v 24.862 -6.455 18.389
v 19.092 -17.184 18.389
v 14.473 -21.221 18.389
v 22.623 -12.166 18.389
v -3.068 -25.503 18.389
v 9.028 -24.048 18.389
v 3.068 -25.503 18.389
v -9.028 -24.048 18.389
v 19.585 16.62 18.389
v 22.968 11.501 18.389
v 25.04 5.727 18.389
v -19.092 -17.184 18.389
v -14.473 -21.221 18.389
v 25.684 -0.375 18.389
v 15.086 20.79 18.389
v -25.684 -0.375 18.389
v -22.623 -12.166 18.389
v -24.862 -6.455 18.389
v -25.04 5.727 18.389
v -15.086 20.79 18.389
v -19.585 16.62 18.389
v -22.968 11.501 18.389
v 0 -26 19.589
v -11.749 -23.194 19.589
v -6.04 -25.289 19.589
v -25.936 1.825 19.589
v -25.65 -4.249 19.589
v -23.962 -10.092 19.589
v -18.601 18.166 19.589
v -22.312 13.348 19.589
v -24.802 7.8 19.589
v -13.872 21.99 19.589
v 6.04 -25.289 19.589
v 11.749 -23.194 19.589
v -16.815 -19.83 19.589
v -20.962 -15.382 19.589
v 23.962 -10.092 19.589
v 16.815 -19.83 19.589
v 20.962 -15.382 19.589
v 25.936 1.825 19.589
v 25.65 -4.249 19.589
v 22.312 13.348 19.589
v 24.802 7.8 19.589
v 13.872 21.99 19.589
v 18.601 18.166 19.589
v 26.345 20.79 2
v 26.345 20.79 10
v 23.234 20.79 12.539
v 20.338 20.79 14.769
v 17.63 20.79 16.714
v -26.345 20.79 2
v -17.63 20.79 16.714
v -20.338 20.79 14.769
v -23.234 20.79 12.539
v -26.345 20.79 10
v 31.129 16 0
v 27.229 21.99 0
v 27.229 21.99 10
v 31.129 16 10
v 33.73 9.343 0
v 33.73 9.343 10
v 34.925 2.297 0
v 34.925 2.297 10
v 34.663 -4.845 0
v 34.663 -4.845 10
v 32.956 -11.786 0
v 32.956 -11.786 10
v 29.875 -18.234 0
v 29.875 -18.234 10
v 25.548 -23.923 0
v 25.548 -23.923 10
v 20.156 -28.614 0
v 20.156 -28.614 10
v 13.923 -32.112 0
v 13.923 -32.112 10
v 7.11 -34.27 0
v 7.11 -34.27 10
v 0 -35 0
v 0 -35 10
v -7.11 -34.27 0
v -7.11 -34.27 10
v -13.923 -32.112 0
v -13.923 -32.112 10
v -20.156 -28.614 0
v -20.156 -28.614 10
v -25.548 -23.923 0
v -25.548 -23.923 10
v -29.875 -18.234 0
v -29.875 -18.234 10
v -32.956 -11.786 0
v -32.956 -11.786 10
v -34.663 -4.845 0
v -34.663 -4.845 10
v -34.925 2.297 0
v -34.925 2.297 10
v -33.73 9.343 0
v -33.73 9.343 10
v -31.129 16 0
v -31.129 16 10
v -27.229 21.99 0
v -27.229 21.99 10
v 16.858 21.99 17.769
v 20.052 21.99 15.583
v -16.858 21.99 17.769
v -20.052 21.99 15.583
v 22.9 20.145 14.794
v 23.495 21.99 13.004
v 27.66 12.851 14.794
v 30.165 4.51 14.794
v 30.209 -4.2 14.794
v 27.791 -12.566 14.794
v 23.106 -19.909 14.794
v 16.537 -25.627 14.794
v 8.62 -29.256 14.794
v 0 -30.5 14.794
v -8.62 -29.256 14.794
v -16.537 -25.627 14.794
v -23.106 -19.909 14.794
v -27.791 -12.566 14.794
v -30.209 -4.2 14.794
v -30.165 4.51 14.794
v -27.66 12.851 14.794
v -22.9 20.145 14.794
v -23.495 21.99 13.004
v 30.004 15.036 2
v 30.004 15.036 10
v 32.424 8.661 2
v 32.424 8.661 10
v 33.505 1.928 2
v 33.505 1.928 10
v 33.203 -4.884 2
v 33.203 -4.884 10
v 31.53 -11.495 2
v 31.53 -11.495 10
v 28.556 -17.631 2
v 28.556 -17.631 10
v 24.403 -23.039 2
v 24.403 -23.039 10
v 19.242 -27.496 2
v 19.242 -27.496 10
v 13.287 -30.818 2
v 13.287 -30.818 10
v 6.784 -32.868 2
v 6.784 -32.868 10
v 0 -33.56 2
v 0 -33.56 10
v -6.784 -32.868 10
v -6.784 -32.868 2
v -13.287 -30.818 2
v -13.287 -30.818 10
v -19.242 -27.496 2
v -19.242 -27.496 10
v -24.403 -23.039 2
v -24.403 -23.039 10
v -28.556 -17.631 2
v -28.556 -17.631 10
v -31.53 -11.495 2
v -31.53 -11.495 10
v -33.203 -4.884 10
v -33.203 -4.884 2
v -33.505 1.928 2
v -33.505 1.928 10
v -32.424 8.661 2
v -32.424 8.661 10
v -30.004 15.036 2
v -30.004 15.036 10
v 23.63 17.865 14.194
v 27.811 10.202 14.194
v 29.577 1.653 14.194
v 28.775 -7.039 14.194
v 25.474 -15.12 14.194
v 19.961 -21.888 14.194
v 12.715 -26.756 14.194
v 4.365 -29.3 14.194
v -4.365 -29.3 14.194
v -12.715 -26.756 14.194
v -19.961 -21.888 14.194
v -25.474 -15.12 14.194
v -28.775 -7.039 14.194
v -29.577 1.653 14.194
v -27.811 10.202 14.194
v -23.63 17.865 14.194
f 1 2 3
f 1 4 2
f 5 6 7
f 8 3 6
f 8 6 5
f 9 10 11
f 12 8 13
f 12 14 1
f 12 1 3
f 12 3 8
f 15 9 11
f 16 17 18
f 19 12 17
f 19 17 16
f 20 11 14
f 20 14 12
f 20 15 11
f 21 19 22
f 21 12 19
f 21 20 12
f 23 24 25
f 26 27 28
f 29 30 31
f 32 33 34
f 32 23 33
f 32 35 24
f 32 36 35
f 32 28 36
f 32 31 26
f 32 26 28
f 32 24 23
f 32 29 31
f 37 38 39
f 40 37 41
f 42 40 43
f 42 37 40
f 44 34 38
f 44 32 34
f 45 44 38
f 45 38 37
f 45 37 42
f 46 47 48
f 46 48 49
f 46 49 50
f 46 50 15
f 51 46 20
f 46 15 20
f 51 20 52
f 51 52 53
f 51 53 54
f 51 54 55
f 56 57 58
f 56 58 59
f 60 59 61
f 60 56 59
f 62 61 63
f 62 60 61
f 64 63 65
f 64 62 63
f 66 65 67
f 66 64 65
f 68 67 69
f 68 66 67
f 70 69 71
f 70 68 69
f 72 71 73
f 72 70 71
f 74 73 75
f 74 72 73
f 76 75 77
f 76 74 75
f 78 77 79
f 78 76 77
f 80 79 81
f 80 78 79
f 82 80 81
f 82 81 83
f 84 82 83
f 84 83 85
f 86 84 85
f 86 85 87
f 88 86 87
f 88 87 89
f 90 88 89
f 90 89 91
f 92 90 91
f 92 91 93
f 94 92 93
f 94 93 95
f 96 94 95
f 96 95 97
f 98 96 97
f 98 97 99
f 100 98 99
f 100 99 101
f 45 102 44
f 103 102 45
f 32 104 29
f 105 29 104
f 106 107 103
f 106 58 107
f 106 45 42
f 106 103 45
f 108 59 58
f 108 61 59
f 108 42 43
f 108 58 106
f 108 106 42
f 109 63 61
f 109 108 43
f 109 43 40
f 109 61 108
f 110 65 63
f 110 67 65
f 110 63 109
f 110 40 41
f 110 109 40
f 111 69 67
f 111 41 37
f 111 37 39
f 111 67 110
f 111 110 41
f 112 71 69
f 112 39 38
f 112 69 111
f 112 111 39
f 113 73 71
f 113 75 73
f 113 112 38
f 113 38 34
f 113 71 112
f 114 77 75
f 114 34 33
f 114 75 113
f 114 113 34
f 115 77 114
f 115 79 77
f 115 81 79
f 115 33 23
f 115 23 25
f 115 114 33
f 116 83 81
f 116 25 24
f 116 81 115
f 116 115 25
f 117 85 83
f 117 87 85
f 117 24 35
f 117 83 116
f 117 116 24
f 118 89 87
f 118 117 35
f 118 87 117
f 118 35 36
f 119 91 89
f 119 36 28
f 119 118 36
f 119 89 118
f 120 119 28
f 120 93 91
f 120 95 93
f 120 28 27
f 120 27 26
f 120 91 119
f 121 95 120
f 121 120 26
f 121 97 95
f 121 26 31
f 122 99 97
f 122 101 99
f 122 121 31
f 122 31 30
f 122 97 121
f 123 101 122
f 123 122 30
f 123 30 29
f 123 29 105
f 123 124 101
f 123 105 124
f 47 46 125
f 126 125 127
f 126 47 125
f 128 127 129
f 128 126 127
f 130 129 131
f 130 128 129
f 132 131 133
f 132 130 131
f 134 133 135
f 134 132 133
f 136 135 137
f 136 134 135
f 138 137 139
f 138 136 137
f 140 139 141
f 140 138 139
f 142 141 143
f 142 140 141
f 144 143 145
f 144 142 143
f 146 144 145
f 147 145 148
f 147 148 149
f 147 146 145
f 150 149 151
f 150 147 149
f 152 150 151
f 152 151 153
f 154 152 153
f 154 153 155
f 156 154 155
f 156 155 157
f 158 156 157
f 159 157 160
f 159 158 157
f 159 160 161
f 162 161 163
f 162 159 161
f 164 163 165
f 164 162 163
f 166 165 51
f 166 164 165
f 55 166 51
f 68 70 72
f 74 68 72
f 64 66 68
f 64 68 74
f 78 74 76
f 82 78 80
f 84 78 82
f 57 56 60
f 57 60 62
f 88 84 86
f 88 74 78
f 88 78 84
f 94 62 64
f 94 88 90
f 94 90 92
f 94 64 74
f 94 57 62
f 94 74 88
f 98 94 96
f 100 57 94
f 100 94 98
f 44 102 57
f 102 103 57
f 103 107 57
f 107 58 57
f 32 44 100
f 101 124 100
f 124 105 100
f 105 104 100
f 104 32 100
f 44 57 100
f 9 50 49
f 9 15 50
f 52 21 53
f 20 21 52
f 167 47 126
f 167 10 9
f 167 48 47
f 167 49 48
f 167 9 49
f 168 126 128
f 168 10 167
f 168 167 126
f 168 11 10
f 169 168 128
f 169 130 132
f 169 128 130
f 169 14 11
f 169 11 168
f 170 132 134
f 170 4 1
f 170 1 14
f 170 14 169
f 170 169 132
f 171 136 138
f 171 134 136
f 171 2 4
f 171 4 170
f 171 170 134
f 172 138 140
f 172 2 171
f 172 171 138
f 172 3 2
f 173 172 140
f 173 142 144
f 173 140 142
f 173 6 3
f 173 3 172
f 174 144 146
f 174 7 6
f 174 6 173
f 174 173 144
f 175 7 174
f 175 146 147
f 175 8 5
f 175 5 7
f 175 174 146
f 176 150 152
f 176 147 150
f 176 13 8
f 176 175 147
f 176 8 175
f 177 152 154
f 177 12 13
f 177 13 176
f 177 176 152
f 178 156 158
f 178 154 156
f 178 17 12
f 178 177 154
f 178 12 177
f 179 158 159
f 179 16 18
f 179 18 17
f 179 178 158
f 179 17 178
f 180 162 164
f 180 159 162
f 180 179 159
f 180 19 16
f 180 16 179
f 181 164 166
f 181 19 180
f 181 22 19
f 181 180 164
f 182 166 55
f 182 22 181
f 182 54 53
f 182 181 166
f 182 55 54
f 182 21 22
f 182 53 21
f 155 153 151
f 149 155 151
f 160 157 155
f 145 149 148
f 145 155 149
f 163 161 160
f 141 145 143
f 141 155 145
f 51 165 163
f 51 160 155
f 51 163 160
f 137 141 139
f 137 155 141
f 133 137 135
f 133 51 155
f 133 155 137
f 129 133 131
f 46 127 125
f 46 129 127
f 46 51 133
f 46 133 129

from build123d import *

# Parameters (mm, degrees)
F1_DEPTH = 2
F5_DEPTH = 19.589616
F7_DEPTH = 1.2


with BuildPart() as f1:
    # F0 (on Top) → F1 (new body)
    with BuildSketch(Plane.XY):
        with BuildLine():
            Line((27.229394, 21.99), (-27.229394, 21.99))
            ThreePointArc((-27.229394, 21.99), (0, -35), (27.229394, 21.99))
        make_face()
    extrude(amount=F1_DEPTH)

    # F2 (on Front) → F3 (revolve)
    with BuildSketch(Plane.XZ):
        Polygon((-35, 0), (-33.560254, 0), (-33.560254, 10), (-25.686589, 18.388616), (0, 18.388616), (0, 19.588616), (-26, 19.588616), (-35, 10), align=None)
    revolve(axis=Axis((0, 0, 12.407482), (0, 0, -1)))

    # F4 (on face) → F5 (cut, through all)
    with BuildSketch(Plane(origin=(0, 0, 0), x_dir=(1, 0, 0), z_dir=(0, 0, -1))):
        Polygon((27.229394, -21.99), (-25.352131, -21.99), (-27.229394, -21.99), (-27.229394, -37.239455), (27.229394, -37.239455), align=None)
    extrude(amount=-F5_DEPTH, mode=Mode.SUBTRACT)

    # F6 (on face) → F7 (join)
    with BuildSketch(Plane(origin=(0, 21.99, 0), x_dir=(-1, 0, 0), z_dir=(0, 1, 0))):
        Polygon((13.872271, 19.588616), (-13.872271, 19.588616), (-27.229394, 10), (-27.229394, 0), (27.229394, 0), (27.229394, 10), align=None)
    extrude(amount=-F7_DEPTH)


solid = f1.part
